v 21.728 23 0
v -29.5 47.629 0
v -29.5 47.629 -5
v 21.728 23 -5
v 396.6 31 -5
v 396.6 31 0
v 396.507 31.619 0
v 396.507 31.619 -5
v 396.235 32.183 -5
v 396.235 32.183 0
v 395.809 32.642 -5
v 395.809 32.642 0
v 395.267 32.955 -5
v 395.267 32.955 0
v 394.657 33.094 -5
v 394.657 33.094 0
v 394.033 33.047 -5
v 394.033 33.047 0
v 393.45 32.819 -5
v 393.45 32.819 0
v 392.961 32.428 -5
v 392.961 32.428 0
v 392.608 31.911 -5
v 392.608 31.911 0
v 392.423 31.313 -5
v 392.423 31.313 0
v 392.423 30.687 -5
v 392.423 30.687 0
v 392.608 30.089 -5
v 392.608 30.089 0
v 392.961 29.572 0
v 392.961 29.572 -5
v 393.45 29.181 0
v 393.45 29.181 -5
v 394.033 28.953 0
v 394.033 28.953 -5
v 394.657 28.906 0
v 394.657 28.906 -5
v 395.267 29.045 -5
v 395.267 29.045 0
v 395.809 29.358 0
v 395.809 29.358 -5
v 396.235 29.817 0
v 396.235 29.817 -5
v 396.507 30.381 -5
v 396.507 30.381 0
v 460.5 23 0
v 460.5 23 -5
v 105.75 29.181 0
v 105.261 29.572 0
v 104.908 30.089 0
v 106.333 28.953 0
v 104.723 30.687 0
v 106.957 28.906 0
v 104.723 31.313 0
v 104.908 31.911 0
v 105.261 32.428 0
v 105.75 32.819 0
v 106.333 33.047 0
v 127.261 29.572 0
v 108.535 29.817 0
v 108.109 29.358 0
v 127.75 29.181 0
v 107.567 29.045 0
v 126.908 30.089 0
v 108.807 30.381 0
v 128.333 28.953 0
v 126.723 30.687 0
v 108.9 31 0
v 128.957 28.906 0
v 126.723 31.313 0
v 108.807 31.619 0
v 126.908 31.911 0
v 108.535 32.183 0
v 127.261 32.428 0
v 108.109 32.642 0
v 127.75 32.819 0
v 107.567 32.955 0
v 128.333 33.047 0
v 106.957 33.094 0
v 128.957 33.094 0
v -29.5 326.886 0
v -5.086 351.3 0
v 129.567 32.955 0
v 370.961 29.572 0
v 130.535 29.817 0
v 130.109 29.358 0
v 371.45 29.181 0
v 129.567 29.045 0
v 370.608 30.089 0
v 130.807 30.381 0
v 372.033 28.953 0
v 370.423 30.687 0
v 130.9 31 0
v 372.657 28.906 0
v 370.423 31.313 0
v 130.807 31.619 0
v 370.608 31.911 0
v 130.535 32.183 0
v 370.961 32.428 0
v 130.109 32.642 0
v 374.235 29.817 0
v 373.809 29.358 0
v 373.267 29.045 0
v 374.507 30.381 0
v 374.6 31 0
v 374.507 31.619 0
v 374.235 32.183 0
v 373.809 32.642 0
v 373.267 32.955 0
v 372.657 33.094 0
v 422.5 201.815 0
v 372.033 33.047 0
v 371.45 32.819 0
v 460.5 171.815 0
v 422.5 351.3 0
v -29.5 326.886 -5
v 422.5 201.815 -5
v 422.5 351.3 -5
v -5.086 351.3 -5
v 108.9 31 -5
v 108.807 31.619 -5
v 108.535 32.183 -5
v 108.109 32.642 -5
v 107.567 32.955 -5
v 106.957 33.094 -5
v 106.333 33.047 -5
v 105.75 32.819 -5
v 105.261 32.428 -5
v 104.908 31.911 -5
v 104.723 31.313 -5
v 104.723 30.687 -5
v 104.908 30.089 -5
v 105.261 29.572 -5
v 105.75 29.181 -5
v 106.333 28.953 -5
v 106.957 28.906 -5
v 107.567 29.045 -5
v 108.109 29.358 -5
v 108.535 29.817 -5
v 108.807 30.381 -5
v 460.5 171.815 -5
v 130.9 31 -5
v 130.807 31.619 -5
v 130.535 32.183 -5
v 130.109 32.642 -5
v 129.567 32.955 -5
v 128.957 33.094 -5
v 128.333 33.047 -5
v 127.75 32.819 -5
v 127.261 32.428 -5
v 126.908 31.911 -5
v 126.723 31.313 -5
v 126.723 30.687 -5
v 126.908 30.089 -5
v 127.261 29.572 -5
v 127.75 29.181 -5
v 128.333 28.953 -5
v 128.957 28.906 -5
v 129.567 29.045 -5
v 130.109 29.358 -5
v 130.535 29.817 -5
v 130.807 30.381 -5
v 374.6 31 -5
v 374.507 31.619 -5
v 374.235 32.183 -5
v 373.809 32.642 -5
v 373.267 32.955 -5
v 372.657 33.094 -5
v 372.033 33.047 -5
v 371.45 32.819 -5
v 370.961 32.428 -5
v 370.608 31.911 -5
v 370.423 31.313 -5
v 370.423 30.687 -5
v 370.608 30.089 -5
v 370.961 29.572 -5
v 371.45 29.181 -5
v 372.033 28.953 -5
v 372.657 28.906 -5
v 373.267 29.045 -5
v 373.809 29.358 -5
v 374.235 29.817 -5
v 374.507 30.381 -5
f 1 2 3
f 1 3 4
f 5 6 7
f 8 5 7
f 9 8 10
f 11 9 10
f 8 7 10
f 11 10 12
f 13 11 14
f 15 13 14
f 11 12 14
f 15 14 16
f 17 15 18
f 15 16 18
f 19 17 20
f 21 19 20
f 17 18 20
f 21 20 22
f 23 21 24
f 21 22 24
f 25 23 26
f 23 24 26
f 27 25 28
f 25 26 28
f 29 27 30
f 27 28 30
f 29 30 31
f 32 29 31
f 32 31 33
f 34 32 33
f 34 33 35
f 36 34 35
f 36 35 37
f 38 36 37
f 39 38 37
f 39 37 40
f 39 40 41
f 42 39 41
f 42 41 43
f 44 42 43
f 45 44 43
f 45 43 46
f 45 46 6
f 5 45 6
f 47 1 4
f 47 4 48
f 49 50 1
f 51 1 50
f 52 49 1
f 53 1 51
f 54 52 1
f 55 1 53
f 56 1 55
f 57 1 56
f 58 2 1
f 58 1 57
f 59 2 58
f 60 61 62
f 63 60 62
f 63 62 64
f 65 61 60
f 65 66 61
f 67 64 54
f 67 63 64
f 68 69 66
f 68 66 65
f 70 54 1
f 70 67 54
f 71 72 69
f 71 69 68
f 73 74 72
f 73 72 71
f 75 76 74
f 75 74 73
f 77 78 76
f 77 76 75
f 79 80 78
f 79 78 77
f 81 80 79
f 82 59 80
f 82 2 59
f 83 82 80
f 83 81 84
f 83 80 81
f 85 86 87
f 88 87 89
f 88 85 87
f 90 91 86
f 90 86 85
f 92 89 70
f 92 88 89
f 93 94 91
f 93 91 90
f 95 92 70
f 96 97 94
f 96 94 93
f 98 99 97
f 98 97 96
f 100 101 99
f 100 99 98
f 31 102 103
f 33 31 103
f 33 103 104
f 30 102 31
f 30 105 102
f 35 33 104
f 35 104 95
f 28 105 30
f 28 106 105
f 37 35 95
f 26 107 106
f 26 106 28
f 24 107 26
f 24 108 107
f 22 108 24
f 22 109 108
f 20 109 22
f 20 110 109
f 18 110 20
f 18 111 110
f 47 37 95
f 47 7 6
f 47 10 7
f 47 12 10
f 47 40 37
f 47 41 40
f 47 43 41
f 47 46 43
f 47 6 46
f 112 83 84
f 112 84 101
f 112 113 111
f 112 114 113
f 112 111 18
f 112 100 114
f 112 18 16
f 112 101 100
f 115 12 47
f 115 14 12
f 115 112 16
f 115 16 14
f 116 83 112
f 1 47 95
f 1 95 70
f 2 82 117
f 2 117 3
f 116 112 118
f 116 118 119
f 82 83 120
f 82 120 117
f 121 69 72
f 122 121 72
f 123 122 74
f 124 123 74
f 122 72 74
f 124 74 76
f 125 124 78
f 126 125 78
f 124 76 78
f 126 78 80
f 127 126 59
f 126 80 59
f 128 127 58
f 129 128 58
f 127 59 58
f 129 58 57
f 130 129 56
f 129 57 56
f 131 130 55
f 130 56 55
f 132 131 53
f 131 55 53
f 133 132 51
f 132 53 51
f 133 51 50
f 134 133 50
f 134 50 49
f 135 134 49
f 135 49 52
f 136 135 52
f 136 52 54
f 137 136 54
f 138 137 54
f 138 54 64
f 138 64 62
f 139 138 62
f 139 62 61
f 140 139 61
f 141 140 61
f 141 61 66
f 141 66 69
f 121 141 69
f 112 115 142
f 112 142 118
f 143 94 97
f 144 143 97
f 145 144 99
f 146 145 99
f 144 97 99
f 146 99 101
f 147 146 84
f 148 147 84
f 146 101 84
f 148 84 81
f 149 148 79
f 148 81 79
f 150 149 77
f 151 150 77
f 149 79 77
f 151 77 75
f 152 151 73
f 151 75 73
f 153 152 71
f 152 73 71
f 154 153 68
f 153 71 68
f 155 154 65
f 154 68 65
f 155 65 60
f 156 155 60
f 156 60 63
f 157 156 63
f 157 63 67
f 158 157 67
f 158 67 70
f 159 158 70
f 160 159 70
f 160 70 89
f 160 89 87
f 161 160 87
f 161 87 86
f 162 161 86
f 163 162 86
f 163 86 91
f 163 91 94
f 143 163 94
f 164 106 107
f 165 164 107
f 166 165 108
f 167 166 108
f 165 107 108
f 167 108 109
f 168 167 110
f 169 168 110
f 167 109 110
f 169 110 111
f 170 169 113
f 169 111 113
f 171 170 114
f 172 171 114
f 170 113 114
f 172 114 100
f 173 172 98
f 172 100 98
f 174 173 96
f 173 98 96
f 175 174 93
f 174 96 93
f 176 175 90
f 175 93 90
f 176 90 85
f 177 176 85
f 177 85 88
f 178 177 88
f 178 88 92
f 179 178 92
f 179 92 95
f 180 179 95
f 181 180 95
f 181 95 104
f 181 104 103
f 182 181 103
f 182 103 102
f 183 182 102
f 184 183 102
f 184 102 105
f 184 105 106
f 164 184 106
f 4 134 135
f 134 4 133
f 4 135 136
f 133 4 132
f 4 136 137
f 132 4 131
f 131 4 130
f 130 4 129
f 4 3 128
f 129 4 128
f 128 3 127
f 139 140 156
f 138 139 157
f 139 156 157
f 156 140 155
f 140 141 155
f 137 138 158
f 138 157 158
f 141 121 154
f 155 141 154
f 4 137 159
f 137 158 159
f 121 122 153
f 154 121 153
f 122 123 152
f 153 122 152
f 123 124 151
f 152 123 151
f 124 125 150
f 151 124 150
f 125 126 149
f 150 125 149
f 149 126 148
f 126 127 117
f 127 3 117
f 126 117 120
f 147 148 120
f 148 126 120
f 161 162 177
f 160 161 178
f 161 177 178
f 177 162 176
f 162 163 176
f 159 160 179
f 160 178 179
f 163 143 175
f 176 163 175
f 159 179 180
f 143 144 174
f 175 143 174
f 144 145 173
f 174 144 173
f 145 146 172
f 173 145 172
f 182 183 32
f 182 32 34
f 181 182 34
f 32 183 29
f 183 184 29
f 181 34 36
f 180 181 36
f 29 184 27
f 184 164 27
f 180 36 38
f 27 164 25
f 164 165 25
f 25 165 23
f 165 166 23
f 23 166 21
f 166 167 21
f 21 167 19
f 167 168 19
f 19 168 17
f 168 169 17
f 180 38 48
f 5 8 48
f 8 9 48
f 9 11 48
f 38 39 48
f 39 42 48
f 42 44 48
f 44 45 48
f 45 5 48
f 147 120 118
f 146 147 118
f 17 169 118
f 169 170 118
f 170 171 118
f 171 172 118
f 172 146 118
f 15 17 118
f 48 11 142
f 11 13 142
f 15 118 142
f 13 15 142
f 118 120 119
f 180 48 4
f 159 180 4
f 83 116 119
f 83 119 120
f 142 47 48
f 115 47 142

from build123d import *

# Parameters (mm, degrees)
BOSS_EXTRU_1_DEPTH      = 5
ESQUISSE3_R             = 2.1
ENL_V_MAT_EXTRU_2_DEPTH = 580.22097683


with BuildPart() as part:
    # Esquisse1 → Boss.-Extru.1 (new body)
    with BuildSketch(Plane.XY):
        Polygon((-29.5, 326.885786438), (-29.5, 47.628797826), (21.727899478, 23), (460.5, 23), (460.5, 171.815398059), (422.5, 201.815398059), (422.5, 351.3), (-5.085786438, 351.3), align=None)
    extrude(amount=-BOSS_EXTRU_1_DEPTH)

    # Esquisse3 → Enlèv. mat.-Extru.2 (cut, through all)
    with BuildSketch(Plane.XY):
        with Locations((106.8, 31)):
            Circle(ESQUISSE3_R)
        with Locations((128.8, 31)):
            Circle(ESQUISSE3_R)
        with Locations((372.5, 31)):
            Circle(ESQUISSE3_R)
        with Locations((394.5, 31)):
            Circle(ESQUISSE3_R)
    extrude(amount=-ENL_V_MAT_EXTRU_2_DEPTH, mode=Mode.SUBTRACT)


solid = part.part
